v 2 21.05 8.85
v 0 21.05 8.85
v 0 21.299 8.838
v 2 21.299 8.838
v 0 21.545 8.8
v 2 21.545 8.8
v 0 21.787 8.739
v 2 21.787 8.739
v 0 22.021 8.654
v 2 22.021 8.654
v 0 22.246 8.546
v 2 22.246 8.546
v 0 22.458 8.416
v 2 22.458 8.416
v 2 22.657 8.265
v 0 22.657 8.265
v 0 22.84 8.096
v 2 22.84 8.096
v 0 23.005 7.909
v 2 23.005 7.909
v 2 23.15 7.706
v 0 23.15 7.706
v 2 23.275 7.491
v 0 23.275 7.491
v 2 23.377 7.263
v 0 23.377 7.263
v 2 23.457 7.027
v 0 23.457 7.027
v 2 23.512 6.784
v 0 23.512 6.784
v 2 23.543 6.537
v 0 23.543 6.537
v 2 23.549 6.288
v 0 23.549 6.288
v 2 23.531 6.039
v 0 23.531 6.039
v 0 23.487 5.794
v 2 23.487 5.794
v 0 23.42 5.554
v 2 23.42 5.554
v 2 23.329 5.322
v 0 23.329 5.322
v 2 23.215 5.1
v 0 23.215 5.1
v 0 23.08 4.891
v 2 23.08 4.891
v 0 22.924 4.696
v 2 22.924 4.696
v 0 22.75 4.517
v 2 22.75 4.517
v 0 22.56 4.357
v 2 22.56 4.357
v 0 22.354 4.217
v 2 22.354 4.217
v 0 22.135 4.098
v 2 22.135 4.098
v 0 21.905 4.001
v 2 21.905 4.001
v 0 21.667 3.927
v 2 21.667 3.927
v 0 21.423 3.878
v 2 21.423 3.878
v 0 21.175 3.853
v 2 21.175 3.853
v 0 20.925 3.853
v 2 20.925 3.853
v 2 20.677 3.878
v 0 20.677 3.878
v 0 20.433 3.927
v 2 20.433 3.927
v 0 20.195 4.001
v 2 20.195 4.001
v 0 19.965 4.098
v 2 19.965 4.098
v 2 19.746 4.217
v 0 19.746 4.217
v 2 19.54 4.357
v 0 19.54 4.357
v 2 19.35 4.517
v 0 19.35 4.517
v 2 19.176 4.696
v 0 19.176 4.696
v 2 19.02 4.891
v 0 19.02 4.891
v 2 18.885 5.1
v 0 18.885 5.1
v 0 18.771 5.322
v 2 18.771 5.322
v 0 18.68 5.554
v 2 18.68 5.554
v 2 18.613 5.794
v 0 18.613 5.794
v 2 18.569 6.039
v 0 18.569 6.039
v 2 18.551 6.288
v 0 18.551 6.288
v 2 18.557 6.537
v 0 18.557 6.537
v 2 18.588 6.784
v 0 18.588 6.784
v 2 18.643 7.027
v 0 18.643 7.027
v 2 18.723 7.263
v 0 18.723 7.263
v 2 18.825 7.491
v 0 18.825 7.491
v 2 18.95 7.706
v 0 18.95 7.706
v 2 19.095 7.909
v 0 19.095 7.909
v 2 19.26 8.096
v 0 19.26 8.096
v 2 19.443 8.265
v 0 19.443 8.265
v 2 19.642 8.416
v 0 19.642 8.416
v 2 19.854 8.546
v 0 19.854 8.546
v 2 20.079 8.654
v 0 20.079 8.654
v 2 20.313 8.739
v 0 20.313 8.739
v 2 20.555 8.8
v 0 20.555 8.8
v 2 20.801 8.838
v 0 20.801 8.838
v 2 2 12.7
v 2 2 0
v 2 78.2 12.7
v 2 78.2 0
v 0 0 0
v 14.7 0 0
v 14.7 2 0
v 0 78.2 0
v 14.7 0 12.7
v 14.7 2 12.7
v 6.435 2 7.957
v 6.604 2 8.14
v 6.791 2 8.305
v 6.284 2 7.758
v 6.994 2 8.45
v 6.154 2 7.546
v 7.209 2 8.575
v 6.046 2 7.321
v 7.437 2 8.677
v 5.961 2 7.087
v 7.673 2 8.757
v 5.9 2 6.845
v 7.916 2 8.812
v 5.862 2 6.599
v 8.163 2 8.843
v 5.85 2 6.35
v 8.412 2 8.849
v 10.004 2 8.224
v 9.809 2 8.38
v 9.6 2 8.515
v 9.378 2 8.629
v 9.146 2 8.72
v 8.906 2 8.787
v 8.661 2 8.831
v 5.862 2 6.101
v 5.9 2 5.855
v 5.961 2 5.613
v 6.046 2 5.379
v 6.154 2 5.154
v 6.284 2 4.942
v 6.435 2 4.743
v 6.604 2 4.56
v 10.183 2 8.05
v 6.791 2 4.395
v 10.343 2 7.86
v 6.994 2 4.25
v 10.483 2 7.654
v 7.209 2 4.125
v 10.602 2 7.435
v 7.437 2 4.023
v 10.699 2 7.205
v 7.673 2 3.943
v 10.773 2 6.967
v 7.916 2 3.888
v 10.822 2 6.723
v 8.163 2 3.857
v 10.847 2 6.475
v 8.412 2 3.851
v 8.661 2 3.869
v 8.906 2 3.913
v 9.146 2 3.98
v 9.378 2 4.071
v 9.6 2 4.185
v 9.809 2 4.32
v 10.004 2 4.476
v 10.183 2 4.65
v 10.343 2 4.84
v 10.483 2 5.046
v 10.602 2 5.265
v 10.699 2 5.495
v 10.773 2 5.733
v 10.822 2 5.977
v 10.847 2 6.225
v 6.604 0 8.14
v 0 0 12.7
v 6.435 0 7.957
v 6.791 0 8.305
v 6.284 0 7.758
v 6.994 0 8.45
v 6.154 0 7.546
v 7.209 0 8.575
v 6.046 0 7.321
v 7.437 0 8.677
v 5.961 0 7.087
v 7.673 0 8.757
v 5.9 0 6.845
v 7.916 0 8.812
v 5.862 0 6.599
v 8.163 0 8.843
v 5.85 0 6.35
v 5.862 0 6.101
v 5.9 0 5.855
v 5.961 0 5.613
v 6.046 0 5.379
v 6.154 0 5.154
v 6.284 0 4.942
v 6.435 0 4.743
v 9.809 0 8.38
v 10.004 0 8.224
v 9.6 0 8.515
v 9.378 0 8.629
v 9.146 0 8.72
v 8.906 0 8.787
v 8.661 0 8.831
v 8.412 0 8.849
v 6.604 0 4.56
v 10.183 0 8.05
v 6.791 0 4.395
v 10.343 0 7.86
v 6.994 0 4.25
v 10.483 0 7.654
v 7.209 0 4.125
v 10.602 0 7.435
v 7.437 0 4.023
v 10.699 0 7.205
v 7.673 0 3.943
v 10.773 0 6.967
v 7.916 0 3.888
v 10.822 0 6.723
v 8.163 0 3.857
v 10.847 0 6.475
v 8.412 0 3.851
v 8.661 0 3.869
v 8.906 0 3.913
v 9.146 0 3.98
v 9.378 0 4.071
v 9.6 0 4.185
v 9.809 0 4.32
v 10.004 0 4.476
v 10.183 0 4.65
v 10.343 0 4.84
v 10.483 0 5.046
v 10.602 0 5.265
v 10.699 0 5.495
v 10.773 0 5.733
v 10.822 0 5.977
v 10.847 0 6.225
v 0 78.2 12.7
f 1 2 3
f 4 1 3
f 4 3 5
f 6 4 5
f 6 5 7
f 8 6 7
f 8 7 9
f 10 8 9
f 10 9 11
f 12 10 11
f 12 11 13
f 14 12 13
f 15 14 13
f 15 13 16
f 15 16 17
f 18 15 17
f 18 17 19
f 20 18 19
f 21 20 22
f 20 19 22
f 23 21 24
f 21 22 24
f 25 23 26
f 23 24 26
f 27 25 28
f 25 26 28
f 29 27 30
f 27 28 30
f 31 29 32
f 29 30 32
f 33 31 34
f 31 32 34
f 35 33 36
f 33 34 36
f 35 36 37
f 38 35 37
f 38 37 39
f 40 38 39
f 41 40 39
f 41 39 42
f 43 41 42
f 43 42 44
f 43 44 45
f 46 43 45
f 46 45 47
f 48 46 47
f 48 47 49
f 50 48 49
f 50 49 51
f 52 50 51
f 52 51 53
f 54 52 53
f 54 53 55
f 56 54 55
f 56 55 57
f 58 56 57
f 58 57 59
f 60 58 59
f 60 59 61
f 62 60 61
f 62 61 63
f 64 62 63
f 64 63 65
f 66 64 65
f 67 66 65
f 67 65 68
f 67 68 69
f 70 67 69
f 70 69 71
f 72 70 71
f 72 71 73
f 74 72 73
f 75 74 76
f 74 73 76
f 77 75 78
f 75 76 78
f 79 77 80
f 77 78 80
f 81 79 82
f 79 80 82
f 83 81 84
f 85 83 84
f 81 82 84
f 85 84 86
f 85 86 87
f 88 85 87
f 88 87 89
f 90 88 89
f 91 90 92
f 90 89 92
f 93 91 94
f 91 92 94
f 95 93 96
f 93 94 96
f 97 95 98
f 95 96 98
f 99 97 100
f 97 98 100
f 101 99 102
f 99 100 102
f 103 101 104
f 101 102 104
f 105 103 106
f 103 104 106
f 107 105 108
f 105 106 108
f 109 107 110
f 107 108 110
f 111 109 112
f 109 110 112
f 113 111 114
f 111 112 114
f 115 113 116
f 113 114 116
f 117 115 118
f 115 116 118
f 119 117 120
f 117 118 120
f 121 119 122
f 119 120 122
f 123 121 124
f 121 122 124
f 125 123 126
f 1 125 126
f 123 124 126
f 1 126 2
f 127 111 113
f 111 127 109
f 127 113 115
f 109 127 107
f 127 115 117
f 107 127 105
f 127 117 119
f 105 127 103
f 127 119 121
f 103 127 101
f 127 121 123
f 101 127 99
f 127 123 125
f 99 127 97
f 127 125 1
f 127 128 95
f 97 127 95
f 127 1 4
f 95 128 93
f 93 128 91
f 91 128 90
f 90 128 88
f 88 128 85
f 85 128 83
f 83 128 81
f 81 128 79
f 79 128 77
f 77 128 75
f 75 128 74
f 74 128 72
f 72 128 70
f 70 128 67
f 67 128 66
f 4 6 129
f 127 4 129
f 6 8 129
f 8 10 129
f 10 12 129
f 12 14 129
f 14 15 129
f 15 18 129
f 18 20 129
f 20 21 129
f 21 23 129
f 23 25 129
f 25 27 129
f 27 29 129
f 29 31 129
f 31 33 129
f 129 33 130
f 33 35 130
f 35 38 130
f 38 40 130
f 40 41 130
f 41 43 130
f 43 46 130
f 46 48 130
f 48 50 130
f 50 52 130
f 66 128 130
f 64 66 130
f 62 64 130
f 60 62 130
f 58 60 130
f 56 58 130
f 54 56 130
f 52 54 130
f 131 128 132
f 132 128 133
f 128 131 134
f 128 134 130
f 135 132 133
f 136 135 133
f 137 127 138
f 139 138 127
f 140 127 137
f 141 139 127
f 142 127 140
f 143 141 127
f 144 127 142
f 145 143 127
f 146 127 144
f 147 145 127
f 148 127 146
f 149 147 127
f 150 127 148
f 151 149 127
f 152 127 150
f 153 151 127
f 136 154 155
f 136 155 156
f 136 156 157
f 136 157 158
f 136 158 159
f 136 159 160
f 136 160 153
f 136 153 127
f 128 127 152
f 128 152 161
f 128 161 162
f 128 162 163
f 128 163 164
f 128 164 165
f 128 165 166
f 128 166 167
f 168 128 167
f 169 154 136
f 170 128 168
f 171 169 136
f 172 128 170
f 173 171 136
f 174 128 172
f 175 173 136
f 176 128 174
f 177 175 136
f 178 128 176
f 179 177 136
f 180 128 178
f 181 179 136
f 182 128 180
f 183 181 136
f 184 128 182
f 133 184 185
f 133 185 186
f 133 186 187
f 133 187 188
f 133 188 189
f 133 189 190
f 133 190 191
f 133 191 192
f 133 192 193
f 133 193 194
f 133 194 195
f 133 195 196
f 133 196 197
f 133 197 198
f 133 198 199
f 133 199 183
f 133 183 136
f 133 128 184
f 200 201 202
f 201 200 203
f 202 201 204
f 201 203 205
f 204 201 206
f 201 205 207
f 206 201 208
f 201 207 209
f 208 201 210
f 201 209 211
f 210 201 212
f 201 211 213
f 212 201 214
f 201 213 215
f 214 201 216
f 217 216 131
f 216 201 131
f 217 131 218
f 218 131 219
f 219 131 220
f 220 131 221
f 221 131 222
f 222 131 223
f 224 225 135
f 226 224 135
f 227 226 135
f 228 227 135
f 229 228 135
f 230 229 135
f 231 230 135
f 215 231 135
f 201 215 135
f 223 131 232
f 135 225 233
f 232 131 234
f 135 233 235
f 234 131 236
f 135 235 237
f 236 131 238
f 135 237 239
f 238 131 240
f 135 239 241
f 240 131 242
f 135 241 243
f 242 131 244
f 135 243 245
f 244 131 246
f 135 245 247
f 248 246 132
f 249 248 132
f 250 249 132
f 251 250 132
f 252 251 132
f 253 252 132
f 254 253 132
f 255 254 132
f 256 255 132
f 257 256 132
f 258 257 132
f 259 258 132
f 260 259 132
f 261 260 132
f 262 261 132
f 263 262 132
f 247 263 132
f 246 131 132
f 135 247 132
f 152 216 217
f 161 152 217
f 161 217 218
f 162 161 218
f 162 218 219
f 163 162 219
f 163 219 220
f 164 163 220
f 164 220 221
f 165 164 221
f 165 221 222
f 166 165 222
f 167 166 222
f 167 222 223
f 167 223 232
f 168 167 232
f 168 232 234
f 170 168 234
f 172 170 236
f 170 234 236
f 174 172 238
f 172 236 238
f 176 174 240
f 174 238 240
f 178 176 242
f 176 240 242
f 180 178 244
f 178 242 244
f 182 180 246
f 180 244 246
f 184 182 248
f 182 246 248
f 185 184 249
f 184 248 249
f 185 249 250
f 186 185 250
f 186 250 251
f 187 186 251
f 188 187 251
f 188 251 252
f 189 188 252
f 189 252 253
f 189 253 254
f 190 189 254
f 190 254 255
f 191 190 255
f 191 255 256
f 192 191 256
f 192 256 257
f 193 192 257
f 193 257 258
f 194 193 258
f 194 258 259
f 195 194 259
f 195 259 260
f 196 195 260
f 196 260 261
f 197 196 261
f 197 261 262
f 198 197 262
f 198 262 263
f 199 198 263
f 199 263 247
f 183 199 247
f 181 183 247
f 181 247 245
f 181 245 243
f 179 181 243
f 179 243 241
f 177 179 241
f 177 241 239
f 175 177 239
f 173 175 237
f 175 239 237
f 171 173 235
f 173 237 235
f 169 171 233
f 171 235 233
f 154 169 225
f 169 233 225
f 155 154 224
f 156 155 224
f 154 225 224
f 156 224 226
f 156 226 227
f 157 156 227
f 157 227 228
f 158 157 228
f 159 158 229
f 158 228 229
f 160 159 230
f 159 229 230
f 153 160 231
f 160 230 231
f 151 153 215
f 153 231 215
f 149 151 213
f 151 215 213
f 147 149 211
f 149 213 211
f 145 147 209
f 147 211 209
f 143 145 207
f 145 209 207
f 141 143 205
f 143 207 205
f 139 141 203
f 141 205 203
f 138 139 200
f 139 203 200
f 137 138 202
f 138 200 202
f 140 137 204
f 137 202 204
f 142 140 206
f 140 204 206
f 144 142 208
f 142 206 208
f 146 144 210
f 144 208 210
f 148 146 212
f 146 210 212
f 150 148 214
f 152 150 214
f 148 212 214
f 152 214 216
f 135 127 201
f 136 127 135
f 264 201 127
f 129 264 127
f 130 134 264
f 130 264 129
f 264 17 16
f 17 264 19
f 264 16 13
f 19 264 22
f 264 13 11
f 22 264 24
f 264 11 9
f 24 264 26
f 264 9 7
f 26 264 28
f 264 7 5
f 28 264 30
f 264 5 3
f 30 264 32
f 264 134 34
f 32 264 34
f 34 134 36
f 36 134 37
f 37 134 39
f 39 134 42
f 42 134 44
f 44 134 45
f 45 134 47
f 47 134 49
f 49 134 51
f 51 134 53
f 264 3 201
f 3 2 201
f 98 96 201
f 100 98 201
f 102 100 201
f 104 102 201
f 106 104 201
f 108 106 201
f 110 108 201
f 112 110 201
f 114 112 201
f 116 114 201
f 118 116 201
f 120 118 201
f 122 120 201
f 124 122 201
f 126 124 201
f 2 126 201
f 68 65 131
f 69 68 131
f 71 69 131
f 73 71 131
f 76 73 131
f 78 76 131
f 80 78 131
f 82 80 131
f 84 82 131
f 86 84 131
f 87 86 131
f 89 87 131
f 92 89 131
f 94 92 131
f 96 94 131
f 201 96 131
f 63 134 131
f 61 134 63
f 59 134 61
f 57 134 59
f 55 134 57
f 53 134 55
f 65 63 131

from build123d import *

# Parameters (mm, degrees)
SKETCH1_W             = 14.7
SKETCH1_H             = 2
SKETCH1_W_2           = 2
SKETCH1_H_2           = 76.2
BOSS_EXTRUDE1_DEPTH   = 12.7
F_5_0MM_DOWEL_HOLE1_D = 5
F_5_0MM_DOWEL_HOLE2_D = 5


with BuildPart() as part:
    # Sketch1 → Boss-Extrude1 (new body)
    with BuildSketch(Plane.XY):
        with Locations((7.35, 1)):
            Rectangle(SKETCH1_W, SKETCH1_H)
        with Locations((1, 40.1)):
            Rectangle(SKETCH1_W_2, SKETCH1_H_2)
    extrude(amount=BOSS_EXTRUDE1_DEPTH)

    # Ø5.0mm Dowel Hole1 (through all)
    with Locations(Plane(origin=(2, 0, 0), x_dir=(0, 0, -1), z_dir=(1, 0, 0))):
        with Locations((-6.35, 21.05)):
            Hole(F_5_0MM_DOWEL_HOLE1_D / 2)

    # Ø5.0mm Dowel Hole2 (through all)
    with Locations(Plane(origin=(0, 2, 0), x_dir=(1, 0, 0), z_dir=(0, 1, 0))):
        with Locations((8.35, -6.35)):
            Hole(F_5_0MM_DOWEL_HOLE2_D / 2)


solid = part.part
